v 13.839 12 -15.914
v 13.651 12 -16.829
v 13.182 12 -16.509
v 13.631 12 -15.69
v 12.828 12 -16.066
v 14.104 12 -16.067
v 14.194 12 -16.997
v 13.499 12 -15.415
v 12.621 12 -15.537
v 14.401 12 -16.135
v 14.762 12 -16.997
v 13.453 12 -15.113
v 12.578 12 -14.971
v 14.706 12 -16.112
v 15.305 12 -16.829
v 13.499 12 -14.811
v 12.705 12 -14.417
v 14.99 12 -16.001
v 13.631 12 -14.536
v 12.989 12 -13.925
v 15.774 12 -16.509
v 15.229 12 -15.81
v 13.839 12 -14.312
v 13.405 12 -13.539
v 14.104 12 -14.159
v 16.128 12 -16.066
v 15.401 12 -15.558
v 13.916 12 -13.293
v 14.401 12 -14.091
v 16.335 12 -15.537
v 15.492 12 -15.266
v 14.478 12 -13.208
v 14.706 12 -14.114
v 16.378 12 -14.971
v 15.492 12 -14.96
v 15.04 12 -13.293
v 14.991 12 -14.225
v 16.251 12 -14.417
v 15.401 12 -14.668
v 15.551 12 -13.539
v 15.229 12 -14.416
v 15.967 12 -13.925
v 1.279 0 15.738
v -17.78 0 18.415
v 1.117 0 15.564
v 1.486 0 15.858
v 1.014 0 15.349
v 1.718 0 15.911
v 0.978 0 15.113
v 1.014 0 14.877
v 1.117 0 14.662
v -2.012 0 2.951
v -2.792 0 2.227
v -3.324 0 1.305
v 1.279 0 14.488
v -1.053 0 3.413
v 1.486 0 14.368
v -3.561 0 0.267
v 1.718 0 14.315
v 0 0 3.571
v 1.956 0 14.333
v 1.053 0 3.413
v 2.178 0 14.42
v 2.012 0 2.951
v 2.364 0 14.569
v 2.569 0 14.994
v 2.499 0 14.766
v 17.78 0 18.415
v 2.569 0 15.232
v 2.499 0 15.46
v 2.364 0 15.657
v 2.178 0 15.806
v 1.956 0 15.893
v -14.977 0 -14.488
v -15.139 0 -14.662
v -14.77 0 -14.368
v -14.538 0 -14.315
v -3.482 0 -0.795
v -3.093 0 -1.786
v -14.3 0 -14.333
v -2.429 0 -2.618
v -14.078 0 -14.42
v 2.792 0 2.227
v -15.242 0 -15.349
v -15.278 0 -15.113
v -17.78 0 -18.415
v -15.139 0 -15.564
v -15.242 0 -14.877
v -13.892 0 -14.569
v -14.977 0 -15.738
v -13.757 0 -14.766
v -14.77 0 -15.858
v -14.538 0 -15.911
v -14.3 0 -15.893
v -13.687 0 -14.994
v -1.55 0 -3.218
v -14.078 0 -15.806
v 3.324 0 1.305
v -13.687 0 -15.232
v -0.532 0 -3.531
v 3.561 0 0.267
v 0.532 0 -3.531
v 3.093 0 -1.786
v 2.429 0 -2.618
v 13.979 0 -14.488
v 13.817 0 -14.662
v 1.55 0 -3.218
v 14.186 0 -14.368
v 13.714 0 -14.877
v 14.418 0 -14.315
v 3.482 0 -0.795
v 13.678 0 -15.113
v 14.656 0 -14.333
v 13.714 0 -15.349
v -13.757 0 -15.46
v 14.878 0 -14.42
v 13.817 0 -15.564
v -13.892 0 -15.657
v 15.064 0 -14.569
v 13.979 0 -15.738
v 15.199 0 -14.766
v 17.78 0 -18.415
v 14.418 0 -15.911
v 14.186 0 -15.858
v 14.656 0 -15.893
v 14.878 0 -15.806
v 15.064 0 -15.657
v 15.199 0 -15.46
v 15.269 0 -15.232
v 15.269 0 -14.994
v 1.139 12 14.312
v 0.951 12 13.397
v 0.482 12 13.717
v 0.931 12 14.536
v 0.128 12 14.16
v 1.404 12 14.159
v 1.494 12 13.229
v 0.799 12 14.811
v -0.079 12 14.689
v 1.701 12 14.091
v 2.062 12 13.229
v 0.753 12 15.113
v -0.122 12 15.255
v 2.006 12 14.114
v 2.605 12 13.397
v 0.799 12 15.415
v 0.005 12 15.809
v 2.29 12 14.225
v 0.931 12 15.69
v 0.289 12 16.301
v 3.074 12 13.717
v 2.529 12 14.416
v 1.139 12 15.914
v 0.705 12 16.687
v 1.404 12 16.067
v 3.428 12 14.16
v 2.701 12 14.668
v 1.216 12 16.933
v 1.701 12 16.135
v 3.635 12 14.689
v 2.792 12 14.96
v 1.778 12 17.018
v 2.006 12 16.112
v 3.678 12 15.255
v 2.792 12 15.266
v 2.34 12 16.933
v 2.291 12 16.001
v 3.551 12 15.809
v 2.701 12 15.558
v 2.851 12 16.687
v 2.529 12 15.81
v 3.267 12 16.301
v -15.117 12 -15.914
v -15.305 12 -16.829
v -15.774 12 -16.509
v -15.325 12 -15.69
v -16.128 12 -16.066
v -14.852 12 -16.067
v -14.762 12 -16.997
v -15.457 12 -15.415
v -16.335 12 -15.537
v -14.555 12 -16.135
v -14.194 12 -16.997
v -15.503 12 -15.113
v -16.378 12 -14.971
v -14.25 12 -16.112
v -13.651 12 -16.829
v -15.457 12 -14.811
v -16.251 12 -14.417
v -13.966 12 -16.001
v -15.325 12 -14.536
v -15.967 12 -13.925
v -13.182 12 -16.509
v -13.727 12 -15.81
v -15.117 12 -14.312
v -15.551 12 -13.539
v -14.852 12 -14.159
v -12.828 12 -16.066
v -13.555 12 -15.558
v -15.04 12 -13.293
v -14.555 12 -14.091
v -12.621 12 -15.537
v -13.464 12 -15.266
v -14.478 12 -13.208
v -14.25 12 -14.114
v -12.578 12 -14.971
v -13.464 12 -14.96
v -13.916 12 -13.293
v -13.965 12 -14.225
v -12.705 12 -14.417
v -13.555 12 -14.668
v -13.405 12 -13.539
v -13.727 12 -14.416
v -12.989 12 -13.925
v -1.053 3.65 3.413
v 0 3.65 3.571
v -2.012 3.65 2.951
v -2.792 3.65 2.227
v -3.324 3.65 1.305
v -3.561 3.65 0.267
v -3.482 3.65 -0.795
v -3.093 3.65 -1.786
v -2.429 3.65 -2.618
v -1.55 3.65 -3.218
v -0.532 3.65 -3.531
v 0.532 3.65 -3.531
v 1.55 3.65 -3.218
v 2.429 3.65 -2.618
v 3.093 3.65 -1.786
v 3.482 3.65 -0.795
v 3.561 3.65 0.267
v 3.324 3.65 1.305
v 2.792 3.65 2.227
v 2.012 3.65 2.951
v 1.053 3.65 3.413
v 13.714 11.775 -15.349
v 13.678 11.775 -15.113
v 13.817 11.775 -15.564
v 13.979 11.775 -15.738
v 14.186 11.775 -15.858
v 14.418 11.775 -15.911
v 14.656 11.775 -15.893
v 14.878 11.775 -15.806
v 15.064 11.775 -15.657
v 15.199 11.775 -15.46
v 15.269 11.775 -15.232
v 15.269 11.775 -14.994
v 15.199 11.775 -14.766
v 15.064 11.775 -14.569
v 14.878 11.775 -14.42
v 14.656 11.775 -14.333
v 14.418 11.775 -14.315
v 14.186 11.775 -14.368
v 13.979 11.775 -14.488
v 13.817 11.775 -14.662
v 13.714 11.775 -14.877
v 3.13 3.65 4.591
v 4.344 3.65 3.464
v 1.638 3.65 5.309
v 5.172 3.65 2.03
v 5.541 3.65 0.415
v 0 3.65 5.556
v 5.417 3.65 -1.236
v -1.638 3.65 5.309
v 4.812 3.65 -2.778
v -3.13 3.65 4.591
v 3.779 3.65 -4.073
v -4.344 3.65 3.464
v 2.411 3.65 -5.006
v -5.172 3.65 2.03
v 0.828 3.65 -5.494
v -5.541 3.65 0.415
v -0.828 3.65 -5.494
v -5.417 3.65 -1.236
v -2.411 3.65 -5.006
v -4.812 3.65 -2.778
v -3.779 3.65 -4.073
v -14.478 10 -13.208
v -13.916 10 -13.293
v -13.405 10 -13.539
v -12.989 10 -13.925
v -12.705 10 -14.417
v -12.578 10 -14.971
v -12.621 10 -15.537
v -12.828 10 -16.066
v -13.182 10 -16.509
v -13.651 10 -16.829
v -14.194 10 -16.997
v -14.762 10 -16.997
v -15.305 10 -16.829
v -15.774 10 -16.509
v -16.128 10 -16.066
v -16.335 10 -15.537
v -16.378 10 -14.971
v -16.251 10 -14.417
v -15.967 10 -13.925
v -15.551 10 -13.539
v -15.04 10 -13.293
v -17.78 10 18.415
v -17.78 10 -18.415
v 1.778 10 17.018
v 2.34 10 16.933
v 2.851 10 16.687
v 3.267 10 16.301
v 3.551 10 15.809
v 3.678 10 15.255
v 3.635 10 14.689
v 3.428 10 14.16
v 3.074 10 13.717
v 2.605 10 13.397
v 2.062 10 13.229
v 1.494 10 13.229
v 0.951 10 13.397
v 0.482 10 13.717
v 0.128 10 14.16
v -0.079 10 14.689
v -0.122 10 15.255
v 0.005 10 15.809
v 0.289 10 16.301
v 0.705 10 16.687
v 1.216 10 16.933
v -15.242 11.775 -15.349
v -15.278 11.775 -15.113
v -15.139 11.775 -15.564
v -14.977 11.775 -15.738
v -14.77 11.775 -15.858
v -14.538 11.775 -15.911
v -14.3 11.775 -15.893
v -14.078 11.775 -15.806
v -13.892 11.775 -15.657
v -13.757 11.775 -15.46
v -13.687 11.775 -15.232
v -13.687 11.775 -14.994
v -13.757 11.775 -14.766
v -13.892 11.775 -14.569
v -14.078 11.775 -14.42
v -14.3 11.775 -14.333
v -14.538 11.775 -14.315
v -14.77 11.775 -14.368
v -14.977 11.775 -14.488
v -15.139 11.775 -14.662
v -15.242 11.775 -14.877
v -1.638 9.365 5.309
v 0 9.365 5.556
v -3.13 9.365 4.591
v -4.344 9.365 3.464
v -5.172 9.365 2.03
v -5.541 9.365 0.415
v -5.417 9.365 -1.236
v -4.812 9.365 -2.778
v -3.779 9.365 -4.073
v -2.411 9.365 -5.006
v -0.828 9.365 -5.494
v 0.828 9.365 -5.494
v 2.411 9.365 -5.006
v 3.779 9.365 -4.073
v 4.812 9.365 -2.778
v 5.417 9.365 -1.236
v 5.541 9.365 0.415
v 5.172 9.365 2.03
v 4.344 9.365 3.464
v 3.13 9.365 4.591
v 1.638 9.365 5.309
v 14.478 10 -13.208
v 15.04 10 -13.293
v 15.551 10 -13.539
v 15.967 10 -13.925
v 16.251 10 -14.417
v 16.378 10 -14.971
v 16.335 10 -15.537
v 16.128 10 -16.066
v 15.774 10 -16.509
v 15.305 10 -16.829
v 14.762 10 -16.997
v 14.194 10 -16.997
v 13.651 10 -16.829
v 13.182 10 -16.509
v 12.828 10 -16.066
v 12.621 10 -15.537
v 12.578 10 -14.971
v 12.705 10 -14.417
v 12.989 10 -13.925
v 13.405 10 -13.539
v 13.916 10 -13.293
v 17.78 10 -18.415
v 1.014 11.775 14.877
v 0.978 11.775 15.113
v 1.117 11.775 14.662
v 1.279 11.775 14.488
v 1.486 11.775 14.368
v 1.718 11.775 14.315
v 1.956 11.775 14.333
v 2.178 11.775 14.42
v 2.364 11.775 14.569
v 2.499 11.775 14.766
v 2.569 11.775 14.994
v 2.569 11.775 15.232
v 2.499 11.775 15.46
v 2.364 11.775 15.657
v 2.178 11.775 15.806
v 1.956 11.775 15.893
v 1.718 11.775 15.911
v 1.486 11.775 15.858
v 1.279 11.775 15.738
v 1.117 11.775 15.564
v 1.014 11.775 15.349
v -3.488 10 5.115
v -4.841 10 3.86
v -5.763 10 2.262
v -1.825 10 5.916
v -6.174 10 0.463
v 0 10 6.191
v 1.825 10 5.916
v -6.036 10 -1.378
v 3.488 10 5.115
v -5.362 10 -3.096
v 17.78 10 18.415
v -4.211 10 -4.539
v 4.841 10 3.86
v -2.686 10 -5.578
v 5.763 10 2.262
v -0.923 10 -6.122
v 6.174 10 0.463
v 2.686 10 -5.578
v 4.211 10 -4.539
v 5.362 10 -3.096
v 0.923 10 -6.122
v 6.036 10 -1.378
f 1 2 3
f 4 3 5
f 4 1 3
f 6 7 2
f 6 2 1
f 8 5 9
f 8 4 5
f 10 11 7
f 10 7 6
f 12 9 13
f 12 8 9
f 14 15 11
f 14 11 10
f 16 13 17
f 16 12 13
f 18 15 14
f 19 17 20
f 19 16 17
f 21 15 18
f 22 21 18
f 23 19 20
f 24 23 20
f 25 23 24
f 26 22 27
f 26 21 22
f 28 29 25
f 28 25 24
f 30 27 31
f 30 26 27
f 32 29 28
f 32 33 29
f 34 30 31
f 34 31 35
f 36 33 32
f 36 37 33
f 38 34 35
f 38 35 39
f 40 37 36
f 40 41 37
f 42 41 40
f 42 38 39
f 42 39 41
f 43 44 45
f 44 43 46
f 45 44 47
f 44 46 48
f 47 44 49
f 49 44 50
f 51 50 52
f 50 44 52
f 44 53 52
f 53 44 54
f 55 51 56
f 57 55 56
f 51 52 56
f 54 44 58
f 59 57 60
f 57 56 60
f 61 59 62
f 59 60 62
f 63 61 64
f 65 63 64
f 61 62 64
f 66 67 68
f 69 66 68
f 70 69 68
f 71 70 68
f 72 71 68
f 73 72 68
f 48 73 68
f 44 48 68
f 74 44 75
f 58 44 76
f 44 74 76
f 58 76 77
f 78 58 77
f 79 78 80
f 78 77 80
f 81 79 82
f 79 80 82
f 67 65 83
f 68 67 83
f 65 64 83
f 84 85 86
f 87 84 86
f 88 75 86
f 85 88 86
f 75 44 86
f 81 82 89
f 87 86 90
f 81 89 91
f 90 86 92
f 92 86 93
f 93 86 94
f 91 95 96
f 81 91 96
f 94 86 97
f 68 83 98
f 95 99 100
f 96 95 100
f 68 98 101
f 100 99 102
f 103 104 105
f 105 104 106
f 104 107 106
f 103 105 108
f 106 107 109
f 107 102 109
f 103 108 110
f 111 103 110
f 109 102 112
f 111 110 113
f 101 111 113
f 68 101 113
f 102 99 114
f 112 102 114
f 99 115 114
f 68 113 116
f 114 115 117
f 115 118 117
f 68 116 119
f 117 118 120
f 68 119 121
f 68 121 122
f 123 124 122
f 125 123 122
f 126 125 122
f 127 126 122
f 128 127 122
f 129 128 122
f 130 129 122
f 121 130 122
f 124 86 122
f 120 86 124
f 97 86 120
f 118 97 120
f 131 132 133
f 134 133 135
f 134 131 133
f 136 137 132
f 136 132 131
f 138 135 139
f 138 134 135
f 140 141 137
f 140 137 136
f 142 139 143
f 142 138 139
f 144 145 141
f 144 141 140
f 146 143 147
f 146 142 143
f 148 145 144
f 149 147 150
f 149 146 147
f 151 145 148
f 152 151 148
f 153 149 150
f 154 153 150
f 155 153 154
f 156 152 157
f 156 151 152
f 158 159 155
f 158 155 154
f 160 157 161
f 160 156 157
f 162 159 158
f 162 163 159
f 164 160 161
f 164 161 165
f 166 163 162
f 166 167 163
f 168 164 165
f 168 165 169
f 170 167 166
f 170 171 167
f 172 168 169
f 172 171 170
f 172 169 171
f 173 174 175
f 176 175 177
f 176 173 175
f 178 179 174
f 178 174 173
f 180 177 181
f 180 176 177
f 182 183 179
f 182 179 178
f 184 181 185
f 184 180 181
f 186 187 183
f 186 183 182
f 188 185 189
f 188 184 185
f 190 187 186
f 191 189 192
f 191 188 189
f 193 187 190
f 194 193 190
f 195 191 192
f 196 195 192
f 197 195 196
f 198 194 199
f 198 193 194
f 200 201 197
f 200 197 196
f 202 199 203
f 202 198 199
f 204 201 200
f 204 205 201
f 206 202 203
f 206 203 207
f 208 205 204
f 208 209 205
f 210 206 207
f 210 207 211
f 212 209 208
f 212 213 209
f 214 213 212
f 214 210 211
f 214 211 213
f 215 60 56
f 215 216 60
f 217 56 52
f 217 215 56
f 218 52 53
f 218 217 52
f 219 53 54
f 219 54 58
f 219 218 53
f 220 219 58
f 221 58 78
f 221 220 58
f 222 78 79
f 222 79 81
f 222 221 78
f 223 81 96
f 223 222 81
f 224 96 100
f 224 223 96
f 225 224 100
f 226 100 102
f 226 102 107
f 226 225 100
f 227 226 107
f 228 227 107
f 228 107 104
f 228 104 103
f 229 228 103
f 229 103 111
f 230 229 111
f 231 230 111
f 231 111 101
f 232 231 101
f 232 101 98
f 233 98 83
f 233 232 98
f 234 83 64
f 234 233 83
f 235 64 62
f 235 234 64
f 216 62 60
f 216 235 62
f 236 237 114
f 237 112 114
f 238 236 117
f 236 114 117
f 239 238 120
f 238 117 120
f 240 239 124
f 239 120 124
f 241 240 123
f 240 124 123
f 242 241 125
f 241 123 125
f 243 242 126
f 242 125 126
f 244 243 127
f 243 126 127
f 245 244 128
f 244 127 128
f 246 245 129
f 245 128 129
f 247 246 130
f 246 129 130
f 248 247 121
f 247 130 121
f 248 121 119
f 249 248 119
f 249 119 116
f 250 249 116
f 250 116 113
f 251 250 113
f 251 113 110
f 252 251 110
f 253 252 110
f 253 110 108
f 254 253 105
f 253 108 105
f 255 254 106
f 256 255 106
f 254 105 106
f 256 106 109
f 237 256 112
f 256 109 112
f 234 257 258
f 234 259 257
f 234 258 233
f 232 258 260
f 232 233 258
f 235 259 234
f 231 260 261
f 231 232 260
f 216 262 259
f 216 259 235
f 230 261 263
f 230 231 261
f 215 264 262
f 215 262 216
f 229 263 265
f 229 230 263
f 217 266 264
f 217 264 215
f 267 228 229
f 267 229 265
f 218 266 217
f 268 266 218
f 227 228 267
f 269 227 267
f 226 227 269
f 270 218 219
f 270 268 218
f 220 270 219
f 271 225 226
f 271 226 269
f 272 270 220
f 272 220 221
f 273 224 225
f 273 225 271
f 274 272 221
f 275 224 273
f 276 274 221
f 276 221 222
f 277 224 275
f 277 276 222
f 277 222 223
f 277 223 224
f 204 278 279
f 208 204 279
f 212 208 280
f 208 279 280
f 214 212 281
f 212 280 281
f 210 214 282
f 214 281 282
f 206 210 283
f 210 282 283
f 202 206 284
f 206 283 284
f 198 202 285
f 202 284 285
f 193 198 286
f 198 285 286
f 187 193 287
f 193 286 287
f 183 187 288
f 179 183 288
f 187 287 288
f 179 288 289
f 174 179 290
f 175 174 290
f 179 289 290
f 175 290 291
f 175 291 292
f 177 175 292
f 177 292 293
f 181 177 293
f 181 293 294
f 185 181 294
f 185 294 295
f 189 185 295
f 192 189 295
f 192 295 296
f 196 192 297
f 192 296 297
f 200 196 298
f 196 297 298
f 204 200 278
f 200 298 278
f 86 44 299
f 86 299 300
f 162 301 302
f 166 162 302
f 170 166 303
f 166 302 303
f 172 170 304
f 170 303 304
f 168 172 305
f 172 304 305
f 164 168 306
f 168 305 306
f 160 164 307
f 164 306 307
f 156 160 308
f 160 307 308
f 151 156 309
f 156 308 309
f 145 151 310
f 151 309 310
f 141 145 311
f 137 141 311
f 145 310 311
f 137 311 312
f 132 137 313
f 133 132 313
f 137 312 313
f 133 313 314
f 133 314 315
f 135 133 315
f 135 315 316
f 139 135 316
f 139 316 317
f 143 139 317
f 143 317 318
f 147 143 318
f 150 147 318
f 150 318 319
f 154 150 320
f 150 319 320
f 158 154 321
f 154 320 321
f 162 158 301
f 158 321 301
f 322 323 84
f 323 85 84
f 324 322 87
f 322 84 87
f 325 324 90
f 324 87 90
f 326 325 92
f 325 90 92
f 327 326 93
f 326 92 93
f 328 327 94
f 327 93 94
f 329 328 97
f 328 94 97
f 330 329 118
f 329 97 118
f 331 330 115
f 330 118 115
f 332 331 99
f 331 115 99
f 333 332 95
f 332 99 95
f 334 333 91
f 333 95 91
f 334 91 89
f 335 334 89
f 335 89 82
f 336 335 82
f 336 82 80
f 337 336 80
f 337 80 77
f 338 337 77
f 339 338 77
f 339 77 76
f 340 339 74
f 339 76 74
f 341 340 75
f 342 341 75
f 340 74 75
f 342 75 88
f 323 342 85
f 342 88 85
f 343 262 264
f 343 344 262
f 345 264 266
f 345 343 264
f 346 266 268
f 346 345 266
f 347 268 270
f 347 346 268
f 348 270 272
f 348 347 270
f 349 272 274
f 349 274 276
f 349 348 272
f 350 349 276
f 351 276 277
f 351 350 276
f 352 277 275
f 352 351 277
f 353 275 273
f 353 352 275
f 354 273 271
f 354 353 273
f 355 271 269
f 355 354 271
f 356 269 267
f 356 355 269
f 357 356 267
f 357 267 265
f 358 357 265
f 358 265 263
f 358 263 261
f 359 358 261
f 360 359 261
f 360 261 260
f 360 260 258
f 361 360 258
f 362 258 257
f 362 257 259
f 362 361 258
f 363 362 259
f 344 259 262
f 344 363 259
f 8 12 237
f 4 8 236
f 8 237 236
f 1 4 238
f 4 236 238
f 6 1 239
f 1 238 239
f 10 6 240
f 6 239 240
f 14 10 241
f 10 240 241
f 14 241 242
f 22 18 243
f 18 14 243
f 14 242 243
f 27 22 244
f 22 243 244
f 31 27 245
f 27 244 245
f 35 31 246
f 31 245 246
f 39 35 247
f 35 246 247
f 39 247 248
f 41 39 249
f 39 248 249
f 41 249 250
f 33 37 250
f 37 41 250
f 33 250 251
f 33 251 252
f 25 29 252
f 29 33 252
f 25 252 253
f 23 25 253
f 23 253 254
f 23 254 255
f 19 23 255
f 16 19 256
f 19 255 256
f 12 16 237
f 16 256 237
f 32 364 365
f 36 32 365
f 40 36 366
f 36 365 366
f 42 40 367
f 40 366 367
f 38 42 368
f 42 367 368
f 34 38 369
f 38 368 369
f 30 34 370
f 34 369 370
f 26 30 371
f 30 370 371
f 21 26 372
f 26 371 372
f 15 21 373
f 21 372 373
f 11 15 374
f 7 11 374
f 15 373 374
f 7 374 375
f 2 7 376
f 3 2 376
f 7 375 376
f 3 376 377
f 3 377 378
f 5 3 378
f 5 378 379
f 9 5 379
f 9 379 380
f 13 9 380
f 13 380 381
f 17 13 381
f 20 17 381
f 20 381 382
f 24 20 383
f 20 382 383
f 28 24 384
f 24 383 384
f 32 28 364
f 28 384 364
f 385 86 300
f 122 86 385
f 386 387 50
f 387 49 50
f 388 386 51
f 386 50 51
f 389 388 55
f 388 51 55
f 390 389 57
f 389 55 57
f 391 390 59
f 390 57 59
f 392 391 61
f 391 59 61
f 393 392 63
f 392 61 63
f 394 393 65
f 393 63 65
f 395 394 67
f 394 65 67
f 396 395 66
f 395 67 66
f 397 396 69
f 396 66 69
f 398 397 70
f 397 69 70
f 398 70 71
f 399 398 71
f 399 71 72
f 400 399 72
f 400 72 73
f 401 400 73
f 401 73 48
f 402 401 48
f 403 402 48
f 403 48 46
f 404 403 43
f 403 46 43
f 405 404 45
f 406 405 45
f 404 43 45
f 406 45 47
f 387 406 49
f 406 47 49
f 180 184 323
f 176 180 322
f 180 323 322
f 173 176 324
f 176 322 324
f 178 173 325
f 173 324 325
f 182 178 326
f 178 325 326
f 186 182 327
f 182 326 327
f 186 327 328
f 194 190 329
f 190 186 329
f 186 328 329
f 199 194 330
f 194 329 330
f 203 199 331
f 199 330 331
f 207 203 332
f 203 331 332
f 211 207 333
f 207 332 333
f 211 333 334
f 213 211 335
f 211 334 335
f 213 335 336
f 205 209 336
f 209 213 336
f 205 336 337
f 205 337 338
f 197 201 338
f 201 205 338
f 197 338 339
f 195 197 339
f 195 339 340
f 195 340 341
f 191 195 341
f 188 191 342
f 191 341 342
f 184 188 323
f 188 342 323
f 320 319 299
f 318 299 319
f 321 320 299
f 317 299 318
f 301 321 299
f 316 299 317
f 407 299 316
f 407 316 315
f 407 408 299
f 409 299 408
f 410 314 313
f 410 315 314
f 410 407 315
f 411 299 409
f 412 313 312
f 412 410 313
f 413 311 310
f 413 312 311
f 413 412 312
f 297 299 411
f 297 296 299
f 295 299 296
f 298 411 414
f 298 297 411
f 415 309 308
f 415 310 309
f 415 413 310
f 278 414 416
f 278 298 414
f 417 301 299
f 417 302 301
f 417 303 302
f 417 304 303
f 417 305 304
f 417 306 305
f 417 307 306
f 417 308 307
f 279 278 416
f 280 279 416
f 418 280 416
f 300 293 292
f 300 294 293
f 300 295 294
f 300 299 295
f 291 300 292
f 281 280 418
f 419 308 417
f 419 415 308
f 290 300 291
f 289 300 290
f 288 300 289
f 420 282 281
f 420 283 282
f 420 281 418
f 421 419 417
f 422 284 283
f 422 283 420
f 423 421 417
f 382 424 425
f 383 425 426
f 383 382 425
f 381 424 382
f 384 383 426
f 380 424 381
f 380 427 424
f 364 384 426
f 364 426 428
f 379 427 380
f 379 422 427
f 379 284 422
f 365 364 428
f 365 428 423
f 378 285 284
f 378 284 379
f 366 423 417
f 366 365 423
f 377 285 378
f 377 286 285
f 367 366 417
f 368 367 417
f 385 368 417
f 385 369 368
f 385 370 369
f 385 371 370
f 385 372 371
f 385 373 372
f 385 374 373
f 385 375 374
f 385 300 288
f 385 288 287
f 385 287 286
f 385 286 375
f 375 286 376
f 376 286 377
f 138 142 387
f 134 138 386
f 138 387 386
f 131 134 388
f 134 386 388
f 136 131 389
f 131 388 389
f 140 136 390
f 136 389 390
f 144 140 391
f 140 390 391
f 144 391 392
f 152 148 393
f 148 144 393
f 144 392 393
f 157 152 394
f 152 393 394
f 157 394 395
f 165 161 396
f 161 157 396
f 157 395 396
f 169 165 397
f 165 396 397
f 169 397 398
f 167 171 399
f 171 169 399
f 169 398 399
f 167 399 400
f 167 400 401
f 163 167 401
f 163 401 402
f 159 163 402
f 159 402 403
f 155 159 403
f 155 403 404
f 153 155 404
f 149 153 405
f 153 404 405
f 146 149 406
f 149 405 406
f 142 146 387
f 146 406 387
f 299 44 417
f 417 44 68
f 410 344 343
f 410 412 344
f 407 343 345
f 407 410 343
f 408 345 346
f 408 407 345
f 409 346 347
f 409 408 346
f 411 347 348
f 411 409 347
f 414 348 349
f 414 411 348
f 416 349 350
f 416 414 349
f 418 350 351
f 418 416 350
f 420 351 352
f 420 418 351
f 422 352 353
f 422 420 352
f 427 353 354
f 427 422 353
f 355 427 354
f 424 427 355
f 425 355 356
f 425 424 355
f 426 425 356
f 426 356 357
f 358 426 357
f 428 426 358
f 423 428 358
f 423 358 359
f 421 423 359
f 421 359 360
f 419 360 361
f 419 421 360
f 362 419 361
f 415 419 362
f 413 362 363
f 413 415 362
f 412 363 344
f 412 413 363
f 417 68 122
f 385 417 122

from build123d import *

# Parameters (mm, degrees)
SKETCH1_W                       = 35.56
SKETCH1_H                       = 36.83
BOSS_EXTRUDE1_DEPTH             = 10
SKETCH5_R                       = 1.905
BOSS_EXTRUDE2_DEPTH             = 2
M2X0_4_TAPPED_HOLE1_D           = 1.6
M2X0_4_TAPPED_HOLE1_CSINK_D     = 2.05
M2X0_4_TAPPED_HOLE1_CSINK_ANGLE = 90


with BuildPart() as part:
    # Sketch1 → Boss-Extrude1 (new body)
    with BuildSketch(Plane(origin=(0, 0, 0), x_dir=(1, 0, 0), z_dir=(0, 1, 0))):
        Rectangle(SKETCH1_W, SKETCH1_H)
    extrude(amount=BOSS_EXTRUDE1_DEPTH)

    # Sketch4 → CBORE for 1/4 Socket Head Cap Screw1 (revolve, cut)
    with BuildSketch(Plane(origin=(0, 10, 0), x_dir=(0, 0, 1), z_dir=(1, 0, 0))):
        Polygon((0, 0), (0, 10), (3.57124, 10), (3.57124, 6.35), (5.55625, 6.35), (5.55625, 0.635), (6.19125, 0), align=None)
    revolve(axis=Axis((0, 16.35, 0), (0, -1, 0)), mode=Mode.SUBTRACT)

    # Sketch5 → Boss-Extrude2 (add)
    with BuildSketch(Plane(origin=(0, 10, 0), x_dir=(1, 0, 0), z_dir=(0, 1, 0))):
        with Locations(Location((-14.478, 15.113, 0), (0, 0, 270))):
            Circle(SKETCH5_R)
        with Locations(Location((14.478, 15.113, 0), (0, 0, 270))):
            Circle(SKETCH5_R)
        with Locations(Location((1.778, -15.113, 0), (0, 0, 270))):
            Circle(SKETCH5_R)
    extrude(amount=BOSS_EXTRUDE2_DEPTH)

    # M2x0.4 Tapped Hole1 (through all)
    with Locations(Plane(origin=(0, 12, 0), x_dir=(1, 0, 0), z_dir=(0, 1, 0))):
        with Locations((-14.478, 15.113), (14.478, 15.113), (1.778, -15.113)):
            CounterSinkHole(M2X0_4_TAPPED_HOLE1_D / 2, M2X0_4_TAPPED_HOLE1_CSINK_D / 2, counter_sink_angle=M2X0_4_TAPPED_HOLE1_CSINK_ANGLE)


solid = part.part
